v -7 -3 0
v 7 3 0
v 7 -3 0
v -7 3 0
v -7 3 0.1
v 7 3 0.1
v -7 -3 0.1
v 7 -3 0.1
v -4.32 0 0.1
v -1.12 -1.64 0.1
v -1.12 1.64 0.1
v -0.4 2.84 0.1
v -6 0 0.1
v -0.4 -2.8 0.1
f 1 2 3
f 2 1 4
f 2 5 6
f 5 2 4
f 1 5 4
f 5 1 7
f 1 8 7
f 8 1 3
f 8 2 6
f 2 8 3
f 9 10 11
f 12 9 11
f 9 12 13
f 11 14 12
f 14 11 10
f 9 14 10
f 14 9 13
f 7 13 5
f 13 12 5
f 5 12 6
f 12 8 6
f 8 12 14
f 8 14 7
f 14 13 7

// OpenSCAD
// file: ../p/4-4edge.scad
use <../lib.scad>
$fa=1; $fs=0.2;
function ldraw_lib__4_4edge(realsolid=false) = [
// 0 Circle 1.0
// 0 Name: 4-4edge.dat
// 0 Author: James Jessiman
// 0 !LDRAW_ORG Primitive UPDATE 2017-01
// 0 !LICENSE Licensed under CC BY 2.0 and CC BY 4.0 : see CAreadme.txt
// 
// 0 BFC CERTIFY CCW
  [0,"BFC","CERTIFY"],
  [0,"BFC","CCW"],
// 
// 0 !HISTORY 1998-12-15 [PTadmin] Official Update 1998-10
// 0 !HISTORY 2005-12-28 [PTadmin] Official Update 2005-01
// 0 !HISTORY 2007-06-24 [PTadmin] Header formatted for Contributor Agreement
// 0 !HISTORY 2008-07-01 [PTadmin] Official Update 2008-01
// 0 !HISTORY 2017-01-15 [Steffen] BFCed
// 0 !HISTORY 2017-12-30 [PTadmin] Official Update 2017-01
// 
// 
// 2 24 1 0 0 0.9239 0 0.3827
  [2,24,1,0,0,0.9239,0,0.3827],
// 2 24 0.9239 0 0.3827 0.7071 0 0.7071
  [2,24,0.9239,0,0.3827,0.7071,0,0.7071],
// 2 24 0.7071 0 0.7071 0.3827 0 0.9239
  [2,24,0.7071,0,0.7071,0.3827,0,0.9239],
// 2 24 0.3827 0 0.9239 0 0 1
  [2,24,0.3827,0,0.9239,0,0,1],
// 2 24 0 0 1 -0.3827 0 0.9239
  [2,24,0,0,1,-0.3827,0,0.9239],
// 2 24 -0.3827 0 0.9239 -0.7071 0 0.7071
  [2,24,-0.3827,0,0.9239,-0.7071,0,0.7071],
// 2 24 -0.7071 0 0.7071 -0.9239 0 0.3827
  [2,24,-0.7071,0,0.7071,-0.9239,0,0.3827],
// 2 24 -0.9239 0 0.3827 -1 0 -0
  [2,24,-0.9239,0,0.3827,-1,0,-0],
// 2 24 -1 0 -0 -0.9239 0 -0.3827
  [2,24,-1,0,-0,-0.9239,0,-0.3827],
// 2 24 -0.9239 0 -0.3827 -0.7071 0 -0.7071
  [2,24,-0.9239,0,-0.3827,-0.7071,0,-0.7071],
// 2 24 -0.7071 0 -0.7071 -0.3827 0 -0.9239
  [2,24,-0.7071,0,-0.7071,-0.3827,0,-0.9239],
// 2 24 -0.3827 0 -0.9239 0 0 -1
  [2,24,-0.3827,0,-0.9239,0,0,-1],
// 2 24 0 0 -1 0.3827 0 -0.9239
  [2,24,0,0,-1,0.3827,0,-0.9239],
// 2 24 0.3827 0 -0.9239 0.7071 0 -0.7071
  [2,24,0.3827,0,-0.9239,0.7071,0,-0.7071],
// 2 24 0.7071 0 -0.7071 0.9239 0 -0.3827
  [2,24,0.7071,0,-0.7071,0.9239,0,-0.3827],
// 2 24 0.9239 0 -0.3827 1 0 0
  [2,24,0.9239,0,-0.3827,1,0,0],
];
module ldraw_lib__4_4edge(step=0, col=false, unit=2/5, alt=false, line=0.2, solid=!$preview)
    makepoly(ldraw_lib__4_4edge(solid), step=step, col=col, unit=unit, alt=alt, line=line, solid=solid);
ldraw_lib__4_4edge(line=0.2);
// file: ../p/4-4disc.scad
use <../lib.scad>
$fa=1; $fs=0.2;
function ldraw_lib__4_4disc(realsolid=false) = [
// 0 Disc 1.0
// 0 Name: 4-4disc.dat
// 0 Author: James Jessiman
// 0 !LDRAW_ORG Primitive UPDATE 2002-02
// 0 !LICENSE Licensed under CC BY 2.0 and CC BY 4.0 : see CAreadme.txt
// 
// 0 BFC CERTIFY CCW
  [0,"BFC","CERTIFY"],
  [0,"BFC","CCW"],
// 
// 0 !HISTORY 1998-12-15 [PTadmin] Official Update 1998-10
// 0 !HISTORY 2002-03-23 [sbliss] Added BFC statement
// 0 !HISTORY 2002-04-25 [PTadmin] Official Update 2002-02
// 0 !HISTORY 2007-06-24 [PTadmin] Header formatted for Contributor Agreement
// 0 !HISTORY 2008-07-01 [PTadmin] Official Update 2008-01
// 
// 
// 3 16 0 0 0 1 0 0 0.9239 0 0.3827
  [3,16,0,0,0,1,0,0,0.9239,0,0.3827],
// 3 16 0 0 0 0.9239 0 0.3827 0.7071 0 0.7071
  [3,16,0,0,0,0.9239,0,0.3827,0.7071,0,0.7071],
// 3 16 0 0 0 0.7071 0 0.7071 0.3827 0 0.9239
  [3,16,0,0,0,0.7071,0,0.7071,0.3827,0,0.9239],
// 3 16 0 0 0 0.3827 0 0.9239 0 0 1
  [3,16,0,0,0,0.3827,0,0.9239,0,0,1],
// 3 16 0 0 0 0 0 1 -0.3827 0 0.9239
  [3,16,0,0,0,0,0,1,-0.3827,0,0.9239],
// 3 16 0 0 0 -0.3827 0 0.9239 -0.7071 0 0.7071
  [3,16,0,0,0,-0.3827,0,0.9239,-0.7071,0,0.7071],
// 3 16 0 0 0 -0.7071 0 0.7071 -0.9239 0 0.3827
  [3,16,0,0,0,-0.7071,0,0.7071,-0.9239,0,0.3827],
// 3 16 0 0 0 -0.9239 0 0.3827 -1 0 -0
  [3,16,0,0,0,-0.9239,0,0.3827,-1,0,-0],
// 3 16 0 0 0 -1 0 -0 -0.9239 0 -0.3827
  [3,16,0,0,0,-1,0,-0,-0.9239,0,-0.3827],
// 3 16 0 0 0 -0.9239 0 -0.3827 -0.7071 0 -0.7071
  [3,16,0,0,0,-0.9239,0,-0.3827,-0.7071,0,-0.7071],
// 3 16 0 0 0 -0.7071 0 -0.7071 -0.3827 0 -0.9239
  [3,16,0,0,0,-0.7071,0,-0.7071,-0.3827,0,-0.9239],
// 3 16 0 0 0 -0.3827 0 -0.9239 0 0 -1
  [3,16,0,0,0,-0.3827,0,-0.9239,0,0,-1],
// 3 16 0 0 0 0 0 -1 0.3827 0 -0.9239
  [3,16,0,0,0,0,0,-1,0.3827,0,-0.9239],
// 3 16 0 0 0 0.3827 0 -0.9239 0.7071 0 -0.7071
  [3,16,0,0,0,0.3827,0,-0.9239,0.7071,0,-0.7071],
// 3 16 0 0 0 0.7071 0 -0.7071 0.9239 0 -0.3827
  [3,16,0,0,0,0.7071,0,-0.7071,0.9239,0,-0.3827],
// 3 16 0 0 0 0.9239 0 -0.3827 1 0 0
  [3,16,0,0,0,0.9239,0,-0.3827,1,0,0],
// 0
];
module ldraw_lib__4_4disc(step=0, col=false, unit=2/5, alt=false, line=0.2, solid=!$preview)
    makepoly(ldraw_lib__4_4disc(solid), step=step, col=col, unit=unit, alt=alt, line=line, solid=solid);
ldraw_lib__4_4disc(line=0.2);
// file: ../p/4-4cyli.scad
use <../lib.scad>
$fa=1; $fs=0.2;
function ldraw_lib__4_4cyli(realsolid=false) = [
// 0 Cylinder 1.0
// 0 Name: 4-4cyli.dat
// 0 Author: James Jessiman
// 0 !LDRAW_ORG Primitive UPDATE 2005-01
// 0 !LICENSE Licensed under CC BY 2.0 and CC BY 4.0 : see CAreadme.txt
// 
// 0 BFC CERTIFY CCW
  [0,"BFC","CERTIFY"],
  [0,"BFC","CCW"],
// 
// 0 !HISTORY 1998-12-15 [PTadmin] Official Update 1998-10
// 0 !HISTORY 2002-03-23 [sbliss] Added BFC statement; merged headers from files in distributions LDraw 0.27 and Complete.
// 0 !HISTORY 2002-04-25 [PTadmin] Official Update 2002-02
// 0 !HISTORY 2004-12-14 [guyvivan] BFC CCW
// 0 !HISTORY 2005-12-28 [PTadmin] Official Update 2005-01
// 0 !HISTORY 2007-06-24 [PTadmin] Header formatted for Contributor Agreement
// 0 !HISTORY 2008-07-01 [PTadmin] Official Update 2008-01
// 
// 
// 4 16 1 1 0 0.9239 1 0.3827 0.9239 0 0.3827 1 0 0
  [4,16,1,1,0,0.9239,1,0.3827,0.9239,0,0.3827,1,0,0],
// 5 24 1 0 0 1 1 0 0.9239 0 0.3827 0.9239 0 -0.3827
  [5,24,1,0,0,1,1,0,0.9239,0,0.3827,0.9239,0,-0.3827],
// 4 16 0.9239 1 0.3827 0.7071 1 0.7071 0.7071 0 0.7071 0.9239 0 0.3827
  [4,16,0.9239,1,0.3827,0.7071,1,0.7071,0.7071,0,0.7071,0.9239,0,0.3827],
// 5 24 0.9239 0 0.3827 0.9239 1 0.3827 0.7071 0 0.7071 1 0 0
  [5,24,0.9239,0,0.3827,0.9239,1,0.3827,0.7071,0,0.7071,1,0,0],
// 4 16 0.7071 1 0.7071 0.3827 1 0.9239 0.3827 0 0.9239 0.7071 0 0.7071
  [4,16,0.7071,1,0.7071,0.3827,1,0.9239,0.3827,0,0.9239,0.7071,0,0.7071],
// 5 24 0.7071 0 0.7071 0.7071 1 0.7071 0.3827 0 0.9239 0.9239 0 0.3827
  [5,24,0.7071,0,0.7071,0.7071,1,0.7071,0.3827,0,0.9239,0.9239,0,0.3827],
// 4 16 0.3827 1 0.9239 0 1 1 0 0 1 0.3827 0 0.9239
  [4,16,0.3827,1,0.9239,0,1,1,0,0,1,0.3827,0,0.9239],
// 5 24 0.3827 0 0.9239 0.3827 1 0.9239 0 0 1 0.7071 0 0.7071
  [5,24,0.3827,0,0.9239,0.3827,1,0.9239,0,0,1,0.7071,0,0.7071],
// 4 16 0 1 1 -0.3827 1 0.9239 -0.3827 0 0.9239 0 0 1
  [4,16,0,1,1,-0.3827,1,0.9239,-0.3827,0,0.9239,0,0,1],
// 5 24 0 0 1 0 1 1 -0.3827 0 0.9239 0.3827 0 0.9239
  [5,24,0,0,1,0,1,1,-0.3827,0,0.9239,0.3827,0,0.9239],
// 4 16 -0.3827 1 0.9239 -0.7071 1 0.7071 -0.7071 0 0.7071 -0.3827 0 0.9239
  [4,16,-0.3827,1,0.9239,-0.7071,1,0.7071,-0.7071,0,0.7071,-0.3827,0,0.9239],
// 5 24 -0.3827 0 0.9239 -0.3827 1 0.9239 -0.7071 0 0.7071 0 0 1
  [5,24,-0.3827,0,0.9239,-0.3827,1,0.9239,-0.7071,0,0.7071,0,0,1],
// 4 16 -0.7071 1 0.7071 -0.9239 1 0.3827 -0.9239 0 0.3827 -0.7071 0 0.7071
  [4,16,-0.7071,1,0.7071,-0.9239,1,0.3827,-0.9239,0,0.3827,-0.7071,0,0.7071],
// 5 24 -0.7071 0 0.7071 -0.7071 1 0.7071 -0.9239 0 0.3827 -0.3827 0 0.9239
  [5,24,-0.7071,0,0.7071,-0.7071,1,0.7071,-0.9239,0,0.3827,-0.3827,0,0.9239],
// 4 16 -0.9239 1 0.3827 -1 1 0 -1 0 0 -0.9239 0 0.3827
  [4,16,-0.9239,1,0.3827,-1,1,0,-1,0,0,-0.9239,0,0.3827],
// 5 24 -0.9239 0 0.3827 -0.9239 1 0.3827 -1 0 0 -0.7071 0 0.7071
  [5,24,-0.9239,0,0.3827,-0.9239,1,0.3827,-1,0,0,-0.7071,0,0.7071],
// 4 16 -1 1 0 -0.9239 1 -0.3827 -0.9239 0 -0.3827 -1 0 0
  [4,16,-1,1,0,-0.9239,1,-0.3827,-0.9239,0,-0.3827,-1,0,0],
// 5 24 -1 0 0 -1 1 0 -0.9239 0 -0.3827 -0.9239 0 0.3827
  [5,24,-1,0,0,-1,1,0,-0.9239,0,-0.3827,-0.9239,0,0.3827],
// 4 16 -0.9239 1 -0.3827 -0.7071 1 -0.7071 -0.7071 0 -0.7071 -0.9239 0 -0.3827
  [4,16,-0.9239,1,-0.3827,-0.7071,1,-0.7071,-0.7071,0,-0.7071,-0.9239,0,-0.3827],
// 5 24 -0.9239 0 -0.3827 -0.9239 1 -0.3827 -0.7071 0 -0.7071 -1 0 0
  [5,24,-0.9239,0,-0.3827,-0.9239,1,-0.3827,-0.7071,0,-0.7071,-1,0,0],
// 4 16 -0.7071 1 -0.7071 -0.3827 1 -0.9239 -0.3827 0 -0.9239 -0.7071 0 -0.7071
  [4,16,-0.7071,1,-0.7071,-0.3827,1,-0.9239,-0.3827,0,-0.9239,-0.7071,0,-0.7071],
// 5 24 -0.7071 0 -0.7071 -0.7071 1 -0.7071 -0.3827 0 -0.9239 -0.9239 0 -0.3827
  [5,24,-0.7071,0,-0.7071,-0.7071,1,-0.7071,-0.3827,0,-0.9239,-0.9239,0,-0.3827],
// 4 16 -0.3827 1 -0.9239 0 1 -1 0 0 -1 -0.3827 0 -0.9239
  [4,16,-0.3827,1,-0.9239,0,1,-1,0,0,-1,-0.3827,0,-0.9239],
// 5 24 -0.3827 0 -0.9239 -0.3827 1 -0.9239 0 0 -1 -0.7071 0 -0.7071
  [5,24,-0.3827,0,-0.9239,-0.3827,1,-0.9239,0,0,-1,-0.7071,0,-0.7071],
// 4 16 0 1 -1 0.3827 1 -0.9239 0.3827 0 -0.9239 0 0 -1
  [4,16,0,1,-1,0.3827,1,-0.9239,0.3827,0,-0.9239,0,0,-1],
// 5 24 0 0 -1 0 1 -1 0.3827 0 -0.9239 -0.3827 0 -0.9239
  [5,24,0,0,-1,0,1,-1,0.3827,0,-0.9239,-0.3827,0,-0.9239],
// 4 16 0.3827 1 -0.9239 0.7071 1 -0.7071 0.7071 0 -0.7071 0.3827 0 -0.9239
  [4,16,0.3827,1,-0.9239,0.7071,1,-0.7071,0.7071,0,-0.7071,0.3827,0,-0.9239],
// 5 24 0.3827 0 -0.9239 0.3827 1 -0.9239 0.7071 0 -0.7071 0 0 -1
  [5,24,0.3827,0,-0.9239,0.3827,1,-0.9239,0.7071,0,-0.7071,0,0,-1],
// 4 16 0.7071 1 -0.7071 0.9239 1 -0.3827 0.9239 0 -0.3827 0.7071 0 -0.7071
  [4,16,0.7071,1,-0.7071,0.9239,1,-0.3827,0.9239,0,-0.3827,0.7071,0,-0.7071],
// 5 24 0.7071 0 -0.7071 0.7071 1 -0.7071 0.9239 0 -0.3827 0.3827 0 -0.9239
  [5,24,0.7071,0,-0.7071,0.7071,1,-0.7071,0.9239,0,-0.3827,0.3827,0,-0.9239],
// 4 16 0.9239 1 -0.3827 1 1 0 1 0 0 0.9239 0 -0.3827
  [4,16,0.9239,1,-0.3827,1,1,0,1,0,0,0.9239,0,-0.3827],
// 5 24 0.9239 0 -0.3827 0.9239 1 -0.3827 1 0 0 0.7071 0 -0.7071
  [5,24,0.9239,0,-0.3827,0.9239,1,-0.3827,1,0,0,0.7071,0,-0.7071],
// 0
];
module ldraw_lib__4_4cyli(step=0, col=false, unit=2/5, alt=false, line=0.2, solid=!$preview)
    makepoly(ldraw_lib__4_4cyli(solid), step=step, col=col, unit=unit, alt=alt, line=line, solid=solid);
ldraw_lib__4_4cyli(line=0.2);
// file: ../p/stud3.scad
use <../lib.scad>
use <4-4cyli.scad>
use <4-4disc.scad>
use <4-4edge.scad>
$fa=1; $fs=0.2;
function ldraw_lib__stud3(realsolid=false) = realsolid ? 
    [openscad(translate([0,0,-eps()], o=cylinder(4+eps(), r=4)),2)] : [
// 0 Stud Tube Solid
// 0 Name: stud3.dat
// 0 Author: James Jessiman
// 0 !LDRAW_ORG Primitive UPDATE 2012-01
// 0 !LICENSE Licensed under CC BY 2.0 and CC BY 4.0 : see CAreadme.txt
// 
// 0 BFC CERTIFY CCW
  [0,"BFC","CERTIFY"],
  [0,"BFC","CCW"],
// 
// 0 !HISTORY 2002-04-04 [sbliss] Modified for BFC compliance
// 0 !HISTORY 2002-04-25 [PTadmin] Official Update 2002-02
// 0 !HISTORY 2007-06-24 [PTadmin] Header formatted for Contributor Agreement
// 0 !HISTORY 2008-07-01 [PTadmin] Official Update 2008-01
// 0 !HISTORY 2012-02-16 [Philo] Changed to CCW
// 0 !HISTORY 2012-03-30 [PTadmin] Official Update 2012-01
// 
// 
// 1 16 0 -4 0 4 0 0 0 1 0 0 0 4 4-4edge.dat
  [1,16,0,-4,0,4,0,0,0,1,0,0,0,4, ldraw_lib__4_4edge(realsolid)],
// 1 16 0 0 0 4 0 0 0 1 0 0 0 4 4-4edge.dat
  [1,16,0,0,0,4,0,0,0,1,0,0,0,4, ldraw_lib__4_4edge(realsolid)],
// 1 16 0 -4 0 4 0 0 0 1 0 0 0 4 4-4disc.dat
  [1,16,0,-4,0,4,0,0,0,1,0,0,0,4, ldraw_lib__4_4disc(realsolid)],
// 1 16 0 -4 0 4 0 0 0 4 0 0 0 4 4-4cyli.dat
  [1,16,0,-4,0,4,0,0,0,4,0,0,0,4, ldraw_lib__4_4cyli(realsolid)],
];
module ldraw_lib__stud3(step=0, col=false, unit=2/5, alt=false, line=0.2, solid=!$preview)
    makepoly(ldraw_lib__stud3(solid), step=step, col=col, unit=unit, alt=alt, line=line, solid=solid);
ldraw_lib__stud3(line=0.2);
// file: ../p/stud.scad
use <../lib.scad>
use <4-4cyli.scad>
use <4-4disc.scad>
use <4-4edge.scad>
$fa=1; $fs=0.2;
function ldraw_lib__stud(realsolid=false) = realsolid ? 
    [openscad(translate([0,0,-eps()], o=cylinder(4+eps(), r=6)),2)] : [
// 0 Stud
// 0 Name: stud.dat
// 0 Author: James Jessiman
// 0 !LDRAW_ORG Primitive UPDATE 2012-01
// 0 !LICENSE Licensed under CC BY 2.0 and CC BY 4.0 : see CAreadme.txt
// 
// 0 BFC CERTIFY CCW
  [0,"BFC","CERTIFY"],
  [0,"BFC","CCW"],
// 
// 0 !HISTORY 2002-04-04 [sbliss] Modified for BFC compliance
// 0 !HISTORY 2002-04-25 [PTadmin] Official Update 2002-02
// 0 !HISTORY 2007-06-24 [PTadmin] Header formatted for Contributor Agreement
// 0 !HISTORY 2008-07-01 [PTadmin] Official Update 2008-01
// 0 !HISTORY 2012-02-16 [Philo] Changed to CCW
// 0 !HISTORY 2012-03-30 [PTadmin] Official Update 2012-01
// 
// 
// 1 16 0 0 0 6 0 0 0 1 0 0 0 6 4-4edge.dat
  [1,16,0,0,0,6,0,0,0,1,0,0,0,6, ldraw_lib__4_4edge(realsolid)],
// 1 16 0 -4 0 6 0 0 0 1 0 0 0 6 4-4edge.dat
  [1,16,0,-4,0,6,0,0,0,1,0,0,0,6, ldraw_lib__4_4edge(realsolid)],
// 1 16 0 0 0 6 0 0 0 -4 0 0 0 6 4-4cyli.dat
  [1,16,0,0,0,6,0,0,0,-4,0,0,0,6, ldraw_lib__4_4cyli(realsolid)],
// 1 16 0 -4 0 6 0 0 0 1 0 0 0 6 4-4disc.dat
  [1,16,0,-4,0,6,0,0,0,1,0,0,0,6, ldraw_lib__4_4disc(realsolid)],
];
module ldraw_lib__stud(step=0, col=false, unit=2/5, alt=false, line=0.2, solid=!$preview)
    makepoly(ldraw_lib__stud(solid), step=step, col=col, unit=unit, alt=alt, line=line, solid=solid);
ldraw_lib__stud(line=0.2);
// file: ../p/box5.scad
use <../lib.scad>
$fa=1; $fs=0.2;
function ldraw_lib__box5(realsolid=false) = [
// 0 Box with 5 Faces and All Edges
// 0 Name: box5.dat
// 0 Author: James Jessiman
// 0 !LDRAW_ORG Primitive UPDATE 2012-01
// 0 !LICENSE Licensed under CC BY 2.0 and CC BY 4.0 : see CAreadme.txt
// 
// 0 BFC CERTIFY CCW
  [0,"BFC","CERTIFY"],
  [0,"BFC","CCW"],
// 
// 0 !HISTORY 2002-04-03 [sbliss] Modified for BFC compliance
// 0 !HISTORY 2002-04-25 [PTadmin] Official Update 2002-02
// 0 !HISTORY 2007-06-24 [PTadmin] Header formatted for Contributor Agreement
// 0 !HISTORY 2008-07-01 [PTadmin] Official Update 2008-01
// 0 !HISTORY 2012-02-16 [Philo] Changed to CCW
// 0 !HISTORY 2012-03-30 [PTadmin] Official Update 2012-01
// 
// 
// 2 24 1 1 1 -1 1 1
  [2,24,1,1,1,-1,1,1],
// 2 24 -1 1 1 -1 1 -1
  [2,24,-1,1,1,-1,1,-1],
// 2 24 -1 1 -1 1 1 -1
  [2,24,-1,1,-1,1,1,-1],
// 2 24 1 1 -1 1 1 1
  [2,24,1,1,-1,1,1,1],
// 2 24 1 0 1 -1 0 1
  [2,24,1,0,1,-1,0,1],
// 2 24 -1 0 1 -1 0 -1
  [2,24,-1,0,1,-1,0,-1],
// 2 24 -1 0 -1 1 0 -1
  [2,24,-1,0,-1,1,0,-1],
// 2 24 1 0 -1 1 0 1
  [2,24,1,0,-1,1,0,1],
// 2 24 1 0 1 1 1 1
  [2,24,1,0,1,1,1,1],
// 2 24 -1 0 1 -1 1 1
  [2,24,-1,0,1,-1,1,1],
// 2 24 1 0 -1 1 1 -1
  [2,24,1,0,-1,1,1,-1],
// 2 24 -1 0 -1 -1 1 -1
  [2,24,-1,0,-1,-1,1,-1],
// 4 16 -1 1 1 1 1 1 1 1 -1 -1 1 -1
  [4,16,-1,1,1,1,1,1,1,1,-1,-1,1,-1],
// 4 16 -1 1 1 -1 0 1 1 0 1 1 1 1
  [4,16,-1,1,1,-1,0,1,1,0,1,1,1,1],
// 4 16 -1 1 -1 -1 0 -1 -1 0 1 -1 1 1
  [4,16,-1,1,-1,-1,0,-1,-1,0,1,-1,1,1],
// 4 16 1 1 -1 1 0 -1 -1 0 -1 -1 1 -1
  [4,16,1,1,-1,1,0,-1,-1,0,-1,-1,1,-1],
// 4 16 1 1 1 1 0 1 1 0 -1 1 1 -1
  [4,16,1,1,1,1,0,1,1,0,-1,1,1,-1],
];
module ldraw_lib__box5(step=0, col=false, unit=2/5, alt=false, line=0.2, solid=!$preview)
    makepoly(ldraw_lib__box5(solid), step=step, col=col, unit=unit, alt=alt, line=line, solid=solid);
ldraw_lib__box5(line=0.2);
// file: ../p/box4t.scad
use <../lib.scad>
$fa=1; $fs=0.2;
function ldraw_lib__box4t(realsolid=false) = [
// 0 Box with 4 Adjacent Faces and All Edges
// 0 Name: box4t.dat
// 0 Author: Tore Eriksson [Tore_Eriksson]
// 0 !LDRAW_ORG Primitive UPDATE 2003-02
// 0 !LICENSE Licensed under CC BY 2.0 and CC BY 4.0 : see CAreadme.txt
// 
// 0 BFC CERTIFY CCW
  [0,"BFC","CERTIFY"],
  [0,"BFC","CCW"],
// 
// 0 !HISTORY 1997-09-29 [PTadmin] Official Update 1997-15
// 0 !HISTORY 2002-08-31 [izanette] Modified with WINDZ for BFC compliance
// 0 !HISTORY 2003-08-01 [PTadmin] Official Update 2003-02
// 0 !HISTORY 2007-06-24 [PTadmin] Header formatted for Contributor Agreement
// 0 !HISTORY 2008-07-01 [PTadmin] Official Update 2008-01
// 
// 
// 2 24 1 1 1 -1 1 1
  [2,24,1,1,1,-1,1,1],
// 2 24 -1 1 1 -1 1 -1
  [2,24,-1,1,1,-1,1,-1],
// 2 24 -1 1 -1 1 1 -1
  [2,24,-1,1,-1,1,1,-1],
// 2 24 1 1 -1 1 1 1
  [2,24,1,1,-1,1,1,1],
// 2 24 1 0 1 -1 0 1
  [2,24,1,0,1,-1,0,1],
// 2 24 -1 0 1 -1 0 -1
  [2,24,-1,0,1,-1,0,-1],
// 2 24 -1 0 -1 1 0 -1
  [2,24,-1,0,-1,1,0,-1],
// 2 24 1 0 -1 1 0 1
  [2,24,1,0,-1,1,0,1],
// 2 24 1 0 1 1 1 1
  [2,24,1,0,1,1,1,1],
// 2 24 -1 0 1 -1 1 1
  [2,24,-1,0,1,-1,1,1],
// 2 24 1 0 -1 1 1 -1
  [2,24,1,0,-1,1,1,-1],
// 2 24 -1 0 -1 -1 1 -1
  [2,24,-1,0,-1,-1,1,-1],
// 4 16 1 1 1 1 1 -1 -1 1 -1 -1 1 1
  [4,16,1,1,1,1,1,-1,-1,1,-1,-1,1,1],
// 4 16 1 1 1 -1 1 1 -1 0 1 1 0 1
  [4,16,1,1,1,-1,1,1,-1,0,1,1,0,1],
// 4 16 -1 1 1 -1 1 -1 -1 0 -1 -1 0 1
  [4,16,-1,1,1,-1,1,-1,-1,0,-1,-1,0,1],
// 0 4 16 -1 1 -1 -1 0 -1 1 0 -1 1 1 -1
// 4 16 1 1 -1 1 1 1 1 0 1 1 0 -1
  [4,16,1,1,-1,1,1,1,1,0,1,1,0,-1],
// 0
];
module ldraw_lib__box4t(step=0, col=false, unit=2/5, alt=false, line=0.2, solid=!$preview)
    makepoly(ldraw_lib__box4t(solid), step=step, col=col, unit=unit, alt=alt, line=line, solid=solid);
ldraw_lib__box4t(line=0.2);
// file: s/3004s01.scad
use <../../lib.scad>
use <../../p/box4t.scad>
use <../../p/box5.scad>
use <../../p/stud.scad>
use <../../p/stud3.scad>
$fa=1; $fs=0.2;
function ldraw_lib__s__3004s01(realsolid=false) = [
// 0 ~Brick  1 x  2 without Front Face
// 0 Name: s\3004s01.dat
// 0 Author: James Jessiman
// 0 !LDRAW_ORG Subpart UPDATE 2003-03
// 0 !LICENSE Licensed under CC BY 2.0 and CC BY 4.0 : see CAreadme.txt
// 
// 0 BFC CERTIFY CCW
  [0,"BFC","CERTIFY"],
  [0,"BFC","CCW"],
// 
// 0 !HISTORY 2003-09-07 [jriley] Subfiling, BFC
// 0 !HISTORY 2003-12-19 [PTadmin] Official Update 2003-03
// 0 !HISTORY 2007-08-29 [PTadmin] Header formatted for Contributor Agreement
// 0 !HISTORY 2008-07-01 [PTadmin] Official Update 2008-01
// 
// 
// 1 16 0 4 0 1 0 0 0 -5 0 0 0 1 stud3.dat
  [1,16,0,4,0,1,0,0,0,-5,0,0,0,1, ldraw_lib__stud3(realsolid)],
// 0 BFC INVERTNEXT
  [0,"BFC","INVERTNEXT"],
// 1 16 0 24 0 16 0 0 0 -20 0 0 0 6 box5.dat
  [1,16,0,24,0,16,0,0,0,-20,0,0,0,6, ldraw_lib__box5(realsolid)],
// 4 16 20 24 10 16 24 6 -16 24 6 -20 24 10
  [4,16,20,24,10,16,24,6,-16,24,6,-20,24,10],
// 4 16 -20 24 10 -16 24 6 -16 24 -6 -20 24 -10
  [4,16,-20,24,10,-16,24,6,-16,24,-6,-20,24,-10],
// 4 16 -20 24 -10 -16 24 -6 16 24 -6 20 24 -10
  [4,16,-20,24,-10,-16,24,-6,16,24,-6,20,24,-10],
// 4 16 20 24 -10 16 24 -6 16 24 6 20 24 10
  [4,16,20,24,-10,16,24,-6,16,24,6,20,24,10],
// 1 16 0 24 0 20 0 0 0 -24 0 0 0 10 box4t.dat
  [1,16,0,24,0,20,0,0,0,-24,0,0,0,10, ldraw_lib__box4t(realsolid)],
// 1 16 10 0 0 1 0 0 0 1 0 0 0 1 stud.dat
  [1,16,10,0,0,1,0,0,0,1,0,0,0,1, ldraw_lib__stud(realsolid)],
// 1 16 -10 0 0 1 0 0 0 1 0 0 0 1 stud.dat
  [1,16,-10,0,0,1,0,0,0,1,0,0,0,1, ldraw_lib__stud(realsolid)],
// 0
];
module ldraw_lib__s__3004s01(step=0, col=false, unit=2/5, alt=false, line=0.2, solid=!$preview)
    makepoly(ldraw_lib__s__3004s01(solid), step=step, col=col, unit=unit, alt=alt, line=line, solid=solid);
ldraw_lib__s__3004s01(line=0.2);
// file: 3004.scad
use <../lib.scad>
use <s/3004s01.scad>
$fa=1; $fs=0.2;
function ldraw_lib__3004(realsolid=false) = [
// 0 Brick  1 x  2
// 0 Name: 3004.dat
// 0 Author: James Jessiman
// 0 !LDRAW_ORG Part UPDATE 2022-05
// 0 !LICENSE Licensed under CC BY 2.0 and CC BY 4.0 : see CAreadme.txt
// 
// 0 BFC CERTIFY CCW
  [0,"BFC","CERTIFY"],
  [0,"BFC","CCW"],
// 
// 0 !HISTORY 2001-10-26 [PTadmin] Official Update 2001-01
// 0 !HISTORY 2002-05-07 {unknown} BFC Certification
// 0 !HISTORY 2002-06-11 [PTadmin] Official Update 2002-03
// 0 !HISTORY 2007-05-07 [PTadmin] Header formatted for Contributor Agreement
// 0 !HISTORY 2008-07-01 [PTadmin] Official Update 2008-01
// 0 !HISTORY 2022-08-04 [MagFors] Using subfile
// 0 !HISTORY 2022-09-15 [PTadmin] Official Update 2022-05
// 
// 
// 1 16 0 0 0 1 0 0 0 1 0 0 0 1 s\3004s01.dat
  [1,16,0,0,0,1,0,0,0,1,0,0,0,1, ldraw_lib__s__3004s01(realsolid)],
// 4 16 -20 24 -10 20 24 -10 20 0 -10 -20 0 -10
  [4,16,-20,24,-10,20,24,-10,20,0,-10,-20,0,-10],
];
module ldraw_lib__3004(step=0, col=false, unit=2/5, alt=false, line=0.2, solid=!$preview)
    makepoly(ldraw_lib__3004(solid), step=step, col=col, unit=unit, alt=alt, line=line, solid=solid);
ldraw_lib__3004(line=0.2);
// file: ../p/box5-12.scad
use <../lib.scad>
$fa=1; $fs=0.2;
function ldraw_lib__box5_12(realsolid=false) = [
// 0 Box with 5 Faces without Any Edges
// 0 Name: box5-12.dat
// 0 Author: Chris Dee [cwdee]
// 0 !LDRAW_ORG Primitive UPDATE 2009-02
// 0 !LICENSE Licensed under CC BY 2.0 and CC BY 4.0 : see CAreadme.txt
// 
// 0 BFC CERTIFY CCW
  [0,"BFC","CERTIFY"],
  [0,"BFC","CCW"],
// 
// 0 !HISTORY 2009-09-03 [PTadmin] Official Update 2009-02
// 
// 
// 4 16 1 1 1 1 1 -1 -1 1 -1 -1 1 1
  [4,16,1,1,1,1,1,-1,-1,1,-1,-1,1,1],
// 4 16 -1 0 1 1 0 1 1 1 1 -1 1 1
  [4,16,-1,0,1,1,0,1,1,1,1,-1,1,1],
// 4 16 -1 0 -1 -1 0 1 -1 1 1 -1 1 -1
  [4,16,-1,0,-1,-1,0,1,-1,1,1,-1,1,-1],
// 4 16 1 0 -1 -1 0 -1 -1 1 -1 1 1 -1
  [4,16,1,0,-1,-1,0,-1,-1,1,-1,1,1,-1],
// 4 16 1 0 1 1 0 -1 1 1 -1 1 1 1
  [4,16,1,0,1,1,0,-1,1,1,-1,1,1,1],
// 0
];
module ldraw_lib__box5_12(step=0, col=false, unit=2/5, alt=false, line=0.2, solid=!$preview)
    makepoly(ldraw_lib__box5_12(solid), step=step, col=col, unit=unit, alt=alt, line=line, solid=solid);
ldraw_lib__box5_12(line=0.2);
// main file
use <../lib.scad>
use <../p/box5-12.scad>
$fa=1; $fs=0.2;
function ldraw_lib__6299663c(realsolid=false) = [
// 0 Sticker  0.7 x  1.7 with Orange Triangle on White Background
// 0 Name: 6299663c.dat
// 0 Author: Evert-Jan Boer [ejboer]
// 0 !LDRAW_ORG Part UPDATE 2020-03
// 0 !LICENSE Licensed under CC BY 2.0 and CC BY 4.0 : see CAreadme.txt
// 
// 0 BFC CERTIFY CCW
  [0,"BFC","CERTIFY"],
  [0,"BFC","CCW"],
// 
// 0 !KEYWORDS A-wing Starfighter UCS, Set 75275
// 
// 0 !HISTORY 2020-12-29 [PTadmin] Official Update 2020-03
// 
// 
// 1 16 0 -0.25 0 17.5 0 0 0 0.25 0 0 0 7.5 box5-12.dat
  [1,16,0,-0.25,0,17.5,0,0,0,0.25,0,0,0,7.5, ldraw_lib__box5_12(realsolid)],
// 
// 3 15 -10.8 -0.25 0 -2.8 -0.25 -4.1 -2.8 -0.25 4.1
  [3,15,-10.8,-0.25,0,-2.8,-0.25,-4.1,-2.8,-0.25,4.1],
// 4 25 -1 -0.25 7.1 -15 -0.25 0 -10.8 -0.25 0 -2.8 -0.25 4.1
  [4,25,-1,-0.25,7.1,-15,-0.25,0,-10.8,-0.25,0,-2.8,-0.25,4.1],
// 4 25 -2.8 -0.25 4.1 -2.8 -0.25 -4.1 -1 -0.25 -7 -1 -0.25 7.1
  [4,25,-2.8,-0.25,4.1,-2.8,-0.25,-4.1,-1,-0.25,-7,-1,-0.25,7.1],
// 4 25 -2.8 -0.25 -4.1 -10.8 -0.25 0 -15 -0.25 0 -1 -0.25 -7
  [4,25,-2.8,-0.25,-4.1,-10.8,-0.25,0,-15,-0.25,0,-1,-0.25,-7],
// 3 15 -17.5 -0.25 -7.5 -15 -0.25 0 -17.5 -0.25 7.5
  [3,15,-17.5,-0.25,-7.5,-15,-0.25,0,-17.5,-0.25,7.5],
// 3 15 -15 -0.25 0 -1 -0.25 7.1 -17.5 -0.25 7.5
  [3,15,-15,-0.25,0,-1,-0.25,7.1,-17.5,-0.25,7.5],
// 3 15 -17.5 -0.25 7.5 -1 -0.25 7.1 17.5 -0.25 7.5
  [3,15,-17.5,-0.25,7.5,-1,-0.25,7.1,17.5,-0.25,7.5],
// 4 15 -1 -0.25 7.1 -1 -0.25 -7 17.5 -0.25 -7.5 17.5 -0.25 7.5
  [4,15,-1,-0.25,7.1,-1,-0.25,-7,17.5,-0.25,-7.5,17.5,-0.25,7.5],
// 3 15 17.5 -0.25 -7.5 -1 -0.25 -7 -17.5 -0.25 -7.5
  [3,15,17.5,-0.25,-7.5,-1,-0.25,-7,-17.5,-0.25,-7.5],
// 3 15 -1 -0.25 -7 -15 -0.25 0 -17.5 -0.25 -7.5
  [3,15,-1,-0.25,-7,-15,-0.25,0,-17.5,-0.25,-7.5],
];
module ldraw_lib__6299663c(step=0, col=false, unit=2/5, alt=false, line=0.2, solid=!$preview)
    makepoly(ldraw_lib__6299663c(solid), step=step, col=col, unit=unit, alt=alt, line=line, solid=solid);
ldraw_lib__6299663c(line=0.2);
